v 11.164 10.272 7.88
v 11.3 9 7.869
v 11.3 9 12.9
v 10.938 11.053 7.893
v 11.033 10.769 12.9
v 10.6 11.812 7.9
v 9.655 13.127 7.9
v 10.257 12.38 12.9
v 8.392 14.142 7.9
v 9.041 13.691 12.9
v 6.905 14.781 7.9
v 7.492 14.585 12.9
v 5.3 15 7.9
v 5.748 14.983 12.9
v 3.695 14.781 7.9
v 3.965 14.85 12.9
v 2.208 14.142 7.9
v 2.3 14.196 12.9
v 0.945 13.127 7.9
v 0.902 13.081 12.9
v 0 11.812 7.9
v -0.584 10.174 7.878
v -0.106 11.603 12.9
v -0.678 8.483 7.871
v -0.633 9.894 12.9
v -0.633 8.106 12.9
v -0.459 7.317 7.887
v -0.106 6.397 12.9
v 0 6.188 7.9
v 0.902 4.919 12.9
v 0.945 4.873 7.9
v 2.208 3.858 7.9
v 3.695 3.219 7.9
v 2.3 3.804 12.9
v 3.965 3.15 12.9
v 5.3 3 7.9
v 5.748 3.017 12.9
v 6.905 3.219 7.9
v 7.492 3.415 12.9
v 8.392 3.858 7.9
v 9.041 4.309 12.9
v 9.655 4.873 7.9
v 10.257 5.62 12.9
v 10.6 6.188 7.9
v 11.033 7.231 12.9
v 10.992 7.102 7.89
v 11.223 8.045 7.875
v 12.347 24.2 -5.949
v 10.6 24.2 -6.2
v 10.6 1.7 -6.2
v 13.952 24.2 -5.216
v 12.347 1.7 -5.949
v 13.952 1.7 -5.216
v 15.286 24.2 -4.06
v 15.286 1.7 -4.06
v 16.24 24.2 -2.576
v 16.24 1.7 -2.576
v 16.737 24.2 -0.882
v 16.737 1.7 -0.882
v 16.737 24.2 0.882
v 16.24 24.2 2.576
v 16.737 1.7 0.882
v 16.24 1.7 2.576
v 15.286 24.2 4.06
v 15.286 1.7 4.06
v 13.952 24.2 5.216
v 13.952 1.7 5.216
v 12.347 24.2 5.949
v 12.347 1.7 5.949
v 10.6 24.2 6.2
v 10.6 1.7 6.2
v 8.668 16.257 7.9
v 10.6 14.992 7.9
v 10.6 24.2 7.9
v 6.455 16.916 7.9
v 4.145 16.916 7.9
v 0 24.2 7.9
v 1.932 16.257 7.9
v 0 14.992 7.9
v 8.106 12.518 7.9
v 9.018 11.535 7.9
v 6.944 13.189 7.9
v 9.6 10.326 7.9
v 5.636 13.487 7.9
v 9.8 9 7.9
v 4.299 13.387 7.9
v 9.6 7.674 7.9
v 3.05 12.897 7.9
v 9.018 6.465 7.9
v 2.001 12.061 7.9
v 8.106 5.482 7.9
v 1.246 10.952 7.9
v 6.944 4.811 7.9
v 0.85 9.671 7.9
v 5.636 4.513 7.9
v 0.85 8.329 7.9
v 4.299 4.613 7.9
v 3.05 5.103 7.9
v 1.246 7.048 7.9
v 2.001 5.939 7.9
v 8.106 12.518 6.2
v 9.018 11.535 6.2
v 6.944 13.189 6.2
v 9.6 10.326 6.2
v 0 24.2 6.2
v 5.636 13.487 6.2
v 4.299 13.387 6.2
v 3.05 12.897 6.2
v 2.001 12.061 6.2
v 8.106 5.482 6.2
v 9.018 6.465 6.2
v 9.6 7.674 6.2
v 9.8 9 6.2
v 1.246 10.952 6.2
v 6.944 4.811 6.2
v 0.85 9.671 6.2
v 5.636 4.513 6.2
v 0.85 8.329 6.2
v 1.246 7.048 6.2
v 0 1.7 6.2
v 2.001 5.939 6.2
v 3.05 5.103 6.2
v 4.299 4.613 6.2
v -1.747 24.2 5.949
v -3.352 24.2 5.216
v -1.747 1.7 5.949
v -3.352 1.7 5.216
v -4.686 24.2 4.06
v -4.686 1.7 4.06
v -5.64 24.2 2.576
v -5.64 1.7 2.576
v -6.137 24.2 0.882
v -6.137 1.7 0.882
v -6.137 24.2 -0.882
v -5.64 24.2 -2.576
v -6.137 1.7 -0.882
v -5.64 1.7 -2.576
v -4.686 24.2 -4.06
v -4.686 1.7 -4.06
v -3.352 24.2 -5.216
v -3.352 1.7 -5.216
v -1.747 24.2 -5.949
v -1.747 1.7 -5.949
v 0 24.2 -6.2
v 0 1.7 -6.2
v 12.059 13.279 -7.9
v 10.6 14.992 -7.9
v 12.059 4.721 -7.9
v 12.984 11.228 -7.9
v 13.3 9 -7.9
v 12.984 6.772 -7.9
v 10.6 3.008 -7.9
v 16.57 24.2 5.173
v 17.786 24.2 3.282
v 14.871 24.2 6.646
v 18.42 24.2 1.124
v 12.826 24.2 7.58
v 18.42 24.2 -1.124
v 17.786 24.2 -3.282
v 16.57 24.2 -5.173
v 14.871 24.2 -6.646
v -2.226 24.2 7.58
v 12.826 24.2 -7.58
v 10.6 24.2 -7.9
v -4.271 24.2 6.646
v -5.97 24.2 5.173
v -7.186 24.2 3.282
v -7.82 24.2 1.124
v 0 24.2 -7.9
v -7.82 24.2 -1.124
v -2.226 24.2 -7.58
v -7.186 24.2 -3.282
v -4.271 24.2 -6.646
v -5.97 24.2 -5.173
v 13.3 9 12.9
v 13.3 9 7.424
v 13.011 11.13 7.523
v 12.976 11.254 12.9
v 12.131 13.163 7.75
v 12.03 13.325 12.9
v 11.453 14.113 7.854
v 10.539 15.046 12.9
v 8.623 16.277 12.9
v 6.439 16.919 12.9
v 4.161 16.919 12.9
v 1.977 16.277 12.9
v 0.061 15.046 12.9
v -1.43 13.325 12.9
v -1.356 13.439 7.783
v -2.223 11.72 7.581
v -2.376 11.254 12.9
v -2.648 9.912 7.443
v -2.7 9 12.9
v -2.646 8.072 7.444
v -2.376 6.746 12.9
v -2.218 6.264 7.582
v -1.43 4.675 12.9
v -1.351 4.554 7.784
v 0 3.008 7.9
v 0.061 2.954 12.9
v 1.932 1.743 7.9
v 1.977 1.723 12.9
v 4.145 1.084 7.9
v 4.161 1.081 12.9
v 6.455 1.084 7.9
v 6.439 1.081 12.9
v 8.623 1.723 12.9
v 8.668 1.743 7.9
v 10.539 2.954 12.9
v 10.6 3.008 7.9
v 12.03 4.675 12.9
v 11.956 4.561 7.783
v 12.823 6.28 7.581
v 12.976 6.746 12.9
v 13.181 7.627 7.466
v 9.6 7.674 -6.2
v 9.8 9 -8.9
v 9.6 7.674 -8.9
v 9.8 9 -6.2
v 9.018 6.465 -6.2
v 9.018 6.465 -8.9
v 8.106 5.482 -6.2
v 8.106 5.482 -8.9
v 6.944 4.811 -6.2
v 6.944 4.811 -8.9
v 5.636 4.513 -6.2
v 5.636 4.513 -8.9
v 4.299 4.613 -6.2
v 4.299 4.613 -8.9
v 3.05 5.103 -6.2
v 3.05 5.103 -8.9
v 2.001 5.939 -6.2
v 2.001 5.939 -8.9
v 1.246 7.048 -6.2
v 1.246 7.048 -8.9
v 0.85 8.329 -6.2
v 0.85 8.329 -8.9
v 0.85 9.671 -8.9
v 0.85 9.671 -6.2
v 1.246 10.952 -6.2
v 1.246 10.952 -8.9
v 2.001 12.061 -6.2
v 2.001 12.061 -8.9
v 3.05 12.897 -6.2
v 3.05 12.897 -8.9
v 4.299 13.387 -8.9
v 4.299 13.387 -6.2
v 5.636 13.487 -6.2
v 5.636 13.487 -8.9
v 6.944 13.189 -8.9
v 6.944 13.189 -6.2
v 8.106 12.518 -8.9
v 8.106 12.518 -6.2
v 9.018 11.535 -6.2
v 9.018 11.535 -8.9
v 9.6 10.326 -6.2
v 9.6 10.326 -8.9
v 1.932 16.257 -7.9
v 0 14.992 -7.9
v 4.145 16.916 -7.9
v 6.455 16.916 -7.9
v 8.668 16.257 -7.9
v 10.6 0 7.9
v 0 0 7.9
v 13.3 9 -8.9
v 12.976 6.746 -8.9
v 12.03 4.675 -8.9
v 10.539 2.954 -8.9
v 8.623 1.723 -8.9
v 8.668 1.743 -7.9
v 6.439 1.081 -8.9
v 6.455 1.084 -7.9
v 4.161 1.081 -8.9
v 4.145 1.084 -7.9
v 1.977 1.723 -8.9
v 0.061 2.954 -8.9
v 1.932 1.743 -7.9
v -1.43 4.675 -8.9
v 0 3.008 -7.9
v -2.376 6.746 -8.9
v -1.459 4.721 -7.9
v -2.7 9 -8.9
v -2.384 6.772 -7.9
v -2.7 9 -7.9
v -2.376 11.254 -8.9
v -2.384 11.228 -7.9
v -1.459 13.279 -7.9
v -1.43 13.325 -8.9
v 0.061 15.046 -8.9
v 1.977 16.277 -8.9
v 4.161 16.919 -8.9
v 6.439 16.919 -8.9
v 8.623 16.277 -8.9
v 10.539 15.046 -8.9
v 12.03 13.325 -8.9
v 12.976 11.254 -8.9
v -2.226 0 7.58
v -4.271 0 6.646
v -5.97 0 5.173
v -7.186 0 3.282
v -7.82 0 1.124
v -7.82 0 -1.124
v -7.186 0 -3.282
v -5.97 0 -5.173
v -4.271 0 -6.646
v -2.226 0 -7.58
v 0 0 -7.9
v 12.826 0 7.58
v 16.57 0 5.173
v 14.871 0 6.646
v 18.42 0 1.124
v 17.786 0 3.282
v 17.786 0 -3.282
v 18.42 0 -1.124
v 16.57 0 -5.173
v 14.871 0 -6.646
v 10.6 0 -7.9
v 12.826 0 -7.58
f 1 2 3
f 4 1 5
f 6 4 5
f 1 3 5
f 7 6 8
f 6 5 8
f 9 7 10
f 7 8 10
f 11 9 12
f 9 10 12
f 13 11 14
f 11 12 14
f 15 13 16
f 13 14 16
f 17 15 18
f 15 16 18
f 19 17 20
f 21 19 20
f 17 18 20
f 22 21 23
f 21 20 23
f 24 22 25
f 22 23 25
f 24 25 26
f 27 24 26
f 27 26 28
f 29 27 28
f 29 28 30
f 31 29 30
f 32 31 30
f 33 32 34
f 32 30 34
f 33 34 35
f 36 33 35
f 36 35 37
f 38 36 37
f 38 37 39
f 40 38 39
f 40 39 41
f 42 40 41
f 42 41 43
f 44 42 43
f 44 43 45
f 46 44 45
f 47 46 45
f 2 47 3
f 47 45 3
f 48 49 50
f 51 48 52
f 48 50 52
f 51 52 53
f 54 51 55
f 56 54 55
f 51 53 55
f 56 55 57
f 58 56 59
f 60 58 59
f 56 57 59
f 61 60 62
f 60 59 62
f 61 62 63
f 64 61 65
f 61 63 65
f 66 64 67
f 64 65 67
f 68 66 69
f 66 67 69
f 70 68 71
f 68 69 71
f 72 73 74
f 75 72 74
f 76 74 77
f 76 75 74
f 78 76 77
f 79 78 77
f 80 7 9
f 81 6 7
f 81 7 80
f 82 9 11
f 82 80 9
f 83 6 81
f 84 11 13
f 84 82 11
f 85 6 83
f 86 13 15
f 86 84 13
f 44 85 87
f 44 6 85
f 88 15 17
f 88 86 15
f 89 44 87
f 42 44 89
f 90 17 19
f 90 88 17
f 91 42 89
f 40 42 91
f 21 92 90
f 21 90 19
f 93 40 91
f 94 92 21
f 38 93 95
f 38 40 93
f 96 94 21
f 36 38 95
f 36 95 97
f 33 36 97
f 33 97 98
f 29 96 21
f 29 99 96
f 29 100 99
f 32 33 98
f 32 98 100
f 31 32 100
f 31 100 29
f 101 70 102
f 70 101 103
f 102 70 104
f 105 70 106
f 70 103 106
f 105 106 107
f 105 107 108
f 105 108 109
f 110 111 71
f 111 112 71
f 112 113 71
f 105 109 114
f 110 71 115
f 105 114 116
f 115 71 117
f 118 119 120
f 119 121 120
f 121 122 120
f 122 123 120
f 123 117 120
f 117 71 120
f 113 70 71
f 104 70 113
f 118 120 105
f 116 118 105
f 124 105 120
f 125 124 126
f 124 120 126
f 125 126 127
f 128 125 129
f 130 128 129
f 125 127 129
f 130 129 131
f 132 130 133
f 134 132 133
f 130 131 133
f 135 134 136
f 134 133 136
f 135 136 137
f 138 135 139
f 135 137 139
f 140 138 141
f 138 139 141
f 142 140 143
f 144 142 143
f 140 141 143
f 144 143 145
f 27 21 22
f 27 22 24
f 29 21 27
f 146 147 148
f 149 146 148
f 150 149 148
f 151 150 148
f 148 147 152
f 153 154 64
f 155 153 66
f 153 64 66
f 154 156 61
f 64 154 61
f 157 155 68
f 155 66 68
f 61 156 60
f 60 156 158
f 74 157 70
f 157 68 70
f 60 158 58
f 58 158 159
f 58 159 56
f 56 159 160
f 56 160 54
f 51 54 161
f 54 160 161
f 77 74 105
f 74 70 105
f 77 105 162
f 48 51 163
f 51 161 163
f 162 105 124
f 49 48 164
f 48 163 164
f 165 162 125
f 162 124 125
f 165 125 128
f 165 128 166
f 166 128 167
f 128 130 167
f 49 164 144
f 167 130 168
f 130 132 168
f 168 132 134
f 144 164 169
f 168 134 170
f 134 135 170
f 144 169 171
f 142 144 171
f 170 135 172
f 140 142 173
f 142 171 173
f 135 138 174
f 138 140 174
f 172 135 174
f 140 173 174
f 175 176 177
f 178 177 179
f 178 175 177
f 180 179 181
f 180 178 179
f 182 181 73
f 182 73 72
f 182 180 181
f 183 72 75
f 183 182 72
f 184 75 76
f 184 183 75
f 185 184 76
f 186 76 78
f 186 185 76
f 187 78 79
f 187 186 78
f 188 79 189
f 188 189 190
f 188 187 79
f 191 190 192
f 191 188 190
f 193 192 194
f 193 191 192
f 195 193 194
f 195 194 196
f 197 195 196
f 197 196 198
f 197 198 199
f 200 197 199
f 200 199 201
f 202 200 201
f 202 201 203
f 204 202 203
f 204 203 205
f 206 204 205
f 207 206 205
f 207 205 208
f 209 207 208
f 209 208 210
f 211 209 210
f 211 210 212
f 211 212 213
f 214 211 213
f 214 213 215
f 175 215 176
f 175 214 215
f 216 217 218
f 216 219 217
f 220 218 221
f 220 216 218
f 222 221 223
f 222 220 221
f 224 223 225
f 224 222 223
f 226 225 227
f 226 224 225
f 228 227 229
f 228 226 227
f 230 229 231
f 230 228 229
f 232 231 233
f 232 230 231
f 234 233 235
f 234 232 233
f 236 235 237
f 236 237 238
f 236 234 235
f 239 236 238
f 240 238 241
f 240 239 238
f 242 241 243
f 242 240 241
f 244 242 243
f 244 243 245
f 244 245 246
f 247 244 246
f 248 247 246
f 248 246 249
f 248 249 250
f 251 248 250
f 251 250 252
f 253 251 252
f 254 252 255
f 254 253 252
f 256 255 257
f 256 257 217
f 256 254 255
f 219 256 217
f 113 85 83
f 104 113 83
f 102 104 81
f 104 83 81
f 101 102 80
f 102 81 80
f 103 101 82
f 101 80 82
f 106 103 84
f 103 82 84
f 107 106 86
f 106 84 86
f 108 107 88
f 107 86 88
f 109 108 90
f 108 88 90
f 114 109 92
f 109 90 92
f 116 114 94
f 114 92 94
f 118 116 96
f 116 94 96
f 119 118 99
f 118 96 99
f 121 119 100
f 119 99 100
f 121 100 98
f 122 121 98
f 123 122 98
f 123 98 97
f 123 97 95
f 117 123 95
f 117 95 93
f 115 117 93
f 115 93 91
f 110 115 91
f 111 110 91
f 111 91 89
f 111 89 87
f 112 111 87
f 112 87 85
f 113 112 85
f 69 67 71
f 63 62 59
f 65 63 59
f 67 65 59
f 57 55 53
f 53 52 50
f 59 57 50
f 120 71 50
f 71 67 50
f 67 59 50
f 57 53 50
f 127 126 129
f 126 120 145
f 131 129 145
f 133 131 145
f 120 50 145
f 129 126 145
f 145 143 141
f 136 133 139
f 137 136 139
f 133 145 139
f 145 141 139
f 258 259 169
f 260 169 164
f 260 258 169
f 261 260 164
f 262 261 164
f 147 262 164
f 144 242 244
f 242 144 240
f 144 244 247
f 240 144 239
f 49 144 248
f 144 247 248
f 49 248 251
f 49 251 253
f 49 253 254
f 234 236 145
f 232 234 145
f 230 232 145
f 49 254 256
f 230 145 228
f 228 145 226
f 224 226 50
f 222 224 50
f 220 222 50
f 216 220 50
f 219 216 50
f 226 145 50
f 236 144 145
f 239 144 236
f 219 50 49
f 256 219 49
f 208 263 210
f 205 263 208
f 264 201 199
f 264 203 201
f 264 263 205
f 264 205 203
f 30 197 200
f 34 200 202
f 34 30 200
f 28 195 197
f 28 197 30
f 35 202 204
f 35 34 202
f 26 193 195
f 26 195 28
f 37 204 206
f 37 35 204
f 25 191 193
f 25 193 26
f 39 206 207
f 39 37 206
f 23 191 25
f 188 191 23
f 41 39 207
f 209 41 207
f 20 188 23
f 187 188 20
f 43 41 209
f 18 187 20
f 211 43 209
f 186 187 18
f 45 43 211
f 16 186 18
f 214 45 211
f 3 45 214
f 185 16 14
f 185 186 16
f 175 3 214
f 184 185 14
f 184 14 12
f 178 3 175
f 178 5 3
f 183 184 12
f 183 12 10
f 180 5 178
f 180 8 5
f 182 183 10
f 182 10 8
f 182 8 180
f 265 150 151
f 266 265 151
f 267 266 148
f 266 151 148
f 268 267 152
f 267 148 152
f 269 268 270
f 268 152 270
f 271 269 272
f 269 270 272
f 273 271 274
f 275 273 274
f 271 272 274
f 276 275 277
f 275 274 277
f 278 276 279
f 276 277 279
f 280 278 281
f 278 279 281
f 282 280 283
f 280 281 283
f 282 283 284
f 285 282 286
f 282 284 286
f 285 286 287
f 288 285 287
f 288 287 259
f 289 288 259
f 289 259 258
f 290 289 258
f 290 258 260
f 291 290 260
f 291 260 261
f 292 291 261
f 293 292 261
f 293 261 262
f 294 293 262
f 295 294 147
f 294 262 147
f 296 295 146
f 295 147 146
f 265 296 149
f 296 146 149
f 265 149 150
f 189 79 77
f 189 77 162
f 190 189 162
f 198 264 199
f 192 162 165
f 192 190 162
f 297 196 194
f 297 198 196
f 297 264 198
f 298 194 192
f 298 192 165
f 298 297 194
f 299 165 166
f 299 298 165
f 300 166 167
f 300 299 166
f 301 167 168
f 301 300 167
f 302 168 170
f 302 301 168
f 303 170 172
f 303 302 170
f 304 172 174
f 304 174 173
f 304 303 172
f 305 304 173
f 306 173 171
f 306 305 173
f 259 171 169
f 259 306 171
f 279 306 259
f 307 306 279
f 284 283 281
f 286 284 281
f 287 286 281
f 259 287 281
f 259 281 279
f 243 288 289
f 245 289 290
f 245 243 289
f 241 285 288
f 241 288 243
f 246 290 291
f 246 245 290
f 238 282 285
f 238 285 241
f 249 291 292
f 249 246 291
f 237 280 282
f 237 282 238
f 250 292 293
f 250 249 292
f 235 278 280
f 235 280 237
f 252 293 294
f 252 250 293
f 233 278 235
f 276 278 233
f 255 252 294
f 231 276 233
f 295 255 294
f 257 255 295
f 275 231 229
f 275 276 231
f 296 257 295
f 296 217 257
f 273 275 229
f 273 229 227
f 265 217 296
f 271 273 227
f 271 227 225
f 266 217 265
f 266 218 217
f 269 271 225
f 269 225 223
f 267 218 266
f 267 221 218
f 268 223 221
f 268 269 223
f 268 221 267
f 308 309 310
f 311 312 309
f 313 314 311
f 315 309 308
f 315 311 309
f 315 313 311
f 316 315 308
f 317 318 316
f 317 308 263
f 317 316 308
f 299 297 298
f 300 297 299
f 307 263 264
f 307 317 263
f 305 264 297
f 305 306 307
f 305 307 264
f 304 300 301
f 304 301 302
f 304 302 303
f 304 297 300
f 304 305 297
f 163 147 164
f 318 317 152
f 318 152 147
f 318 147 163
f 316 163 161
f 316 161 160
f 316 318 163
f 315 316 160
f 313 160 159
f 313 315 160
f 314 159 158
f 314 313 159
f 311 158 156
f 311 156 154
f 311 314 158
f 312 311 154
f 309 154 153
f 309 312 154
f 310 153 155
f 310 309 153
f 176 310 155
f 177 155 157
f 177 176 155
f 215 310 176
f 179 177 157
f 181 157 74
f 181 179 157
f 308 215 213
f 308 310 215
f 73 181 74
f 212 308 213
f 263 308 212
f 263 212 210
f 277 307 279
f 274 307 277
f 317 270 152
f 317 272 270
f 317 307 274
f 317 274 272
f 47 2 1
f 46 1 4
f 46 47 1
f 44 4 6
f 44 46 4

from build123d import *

# Parameters (mm, degrees)
EXTRUDE_1_DEPTH     = 24.2
SHELL_1_T           = -1.7
EXTRUDE_2_REACH     = 38.885
SKETCH_2_R          = 8
SKETCH_2_R_2        = 6
SKETCH_3_R          = 4.5
CUT_EXTRUDE_1_DEPTH = 35.315157171
SKETCH_4_R          = 8
SKETCH_4_R_2        = 4.5
EXTRUDE_3_DEPTH     = 1


with BuildPart() as part:
    # 草圖1 → 填料-伸長1 (new body)
    with BuildSketch(Plane(origin=(0, 0, 0), x_dir=(1, 0, 0), z_dir=(0, 1, 0))):
        with BuildLine():
            Line((0, 7.9), (10.6, 7.9))
            ThreePointArc((10.6, 7.9), (18.5, 0), (10.6, -7.9))
            Line((10.6, -7.9), (0, -7.9))
            ThreePointArc((0, -7.9), (-7.9, 0), (0, 7.9))
        make_face()
    extrude(amount=EXTRUDE_1_DEPTH)

    # 薄殼1
    shell_1_openings = [part.faces().sort_by_distance(p)[0] for p in [
        (5.3, 24.2, 0),
    ]]
    offset(amount=SHELL_1_T, openings=shell_1_openings, kind=Kind.INTERSECTION)

    # 草圖2 → 填料-伸長2 (add, up to next)
    with BuildSketch(Plane.XY.offset(12.9), mode=Mode.PRIVATE) as extrude_2_sk1:
        with Locations((5.3, 9)):
            Circle(SKETCH_2_R)
        with Locations((5.3, 9)):
            Circle(SKETCH_2_R_2, mode=Mode.SUBTRACT)
    extrude_2_tool1 = extrude(extrude_2_sk1.sketch, amount=-EXTRUDE_2_REACH, mode=Mode.PRIVATE) - part.part
    add(extrude_2_tool1.solids().sort_by_distance((-2.473726, 9, 12.9))[0])

    # 草圖3 → 除料-伸長1 (cut, through all)
    with BuildSketch(Plane.XY.offset(7.9)):
        with Locations((5.3, 9)):
            Circle(SKETCH_3_R)
    extrude(amount=-CUT_EXTRUDE_1_DEPTH, mode=Mode.SUBTRACT)

    # 草圖4 → 填料-伸長3 (add)
    with BuildSketch(Plane(origin=(0, 0, -7.9), x_dir=(-1, 0, 0), z_dir=(0, 0, -1))):
        with Locations(Location((-5.3, 9, 0), (0, 0, 180))):
            Circle(SKETCH_4_R)
        with Locations(Location((-5.3, 9, 0), (0, 0, 180))):
            Circle(SKETCH_4_R_2, mode=Mode.SUBTRACT)
    extrude(amount=EXTRUDE_3_DEPTH)


solid = part.part
